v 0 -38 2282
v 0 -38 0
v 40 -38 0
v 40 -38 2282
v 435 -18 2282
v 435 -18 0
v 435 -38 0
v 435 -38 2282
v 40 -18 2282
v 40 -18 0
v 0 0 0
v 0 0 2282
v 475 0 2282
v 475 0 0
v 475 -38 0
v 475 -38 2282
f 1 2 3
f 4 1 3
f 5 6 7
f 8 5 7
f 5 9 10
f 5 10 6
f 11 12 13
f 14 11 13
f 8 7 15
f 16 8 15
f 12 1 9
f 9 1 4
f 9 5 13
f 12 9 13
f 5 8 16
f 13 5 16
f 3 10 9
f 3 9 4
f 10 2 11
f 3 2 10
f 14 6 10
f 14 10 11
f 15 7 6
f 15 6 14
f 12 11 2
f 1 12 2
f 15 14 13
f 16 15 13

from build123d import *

# Parameters (mm, degrees)
F0_W     = 475
F0_H     = 2282
F1_DEPTH = 18
F2_W     = 40
F2_H     = 20
F3_DEPTH = 2282


with BuildPart() as f1:
    # F0 (on Front) → F1 (new body)
    with BuildSketch(Plane.XZ):
        with Locations((237.5, 1141)):
            Rectangle(F0_W, F0_H)
    extrude(amount=F1_DEPTH)

    # F2 (on face) → F3 (join)
    with BuildSketch(Plane(origin=(0, 0, 0), x_dir=(1, 0, 0), z_dir=(0, 0, -1))):
        with Locations((20, 28)):
            Rectangle(F2_W, F2_H)
        with Locations((455, 28)):
            Rectangle(F2_W, F2_H)
    extrude(amount=-F3_DEPTH)


solid = f1.part
